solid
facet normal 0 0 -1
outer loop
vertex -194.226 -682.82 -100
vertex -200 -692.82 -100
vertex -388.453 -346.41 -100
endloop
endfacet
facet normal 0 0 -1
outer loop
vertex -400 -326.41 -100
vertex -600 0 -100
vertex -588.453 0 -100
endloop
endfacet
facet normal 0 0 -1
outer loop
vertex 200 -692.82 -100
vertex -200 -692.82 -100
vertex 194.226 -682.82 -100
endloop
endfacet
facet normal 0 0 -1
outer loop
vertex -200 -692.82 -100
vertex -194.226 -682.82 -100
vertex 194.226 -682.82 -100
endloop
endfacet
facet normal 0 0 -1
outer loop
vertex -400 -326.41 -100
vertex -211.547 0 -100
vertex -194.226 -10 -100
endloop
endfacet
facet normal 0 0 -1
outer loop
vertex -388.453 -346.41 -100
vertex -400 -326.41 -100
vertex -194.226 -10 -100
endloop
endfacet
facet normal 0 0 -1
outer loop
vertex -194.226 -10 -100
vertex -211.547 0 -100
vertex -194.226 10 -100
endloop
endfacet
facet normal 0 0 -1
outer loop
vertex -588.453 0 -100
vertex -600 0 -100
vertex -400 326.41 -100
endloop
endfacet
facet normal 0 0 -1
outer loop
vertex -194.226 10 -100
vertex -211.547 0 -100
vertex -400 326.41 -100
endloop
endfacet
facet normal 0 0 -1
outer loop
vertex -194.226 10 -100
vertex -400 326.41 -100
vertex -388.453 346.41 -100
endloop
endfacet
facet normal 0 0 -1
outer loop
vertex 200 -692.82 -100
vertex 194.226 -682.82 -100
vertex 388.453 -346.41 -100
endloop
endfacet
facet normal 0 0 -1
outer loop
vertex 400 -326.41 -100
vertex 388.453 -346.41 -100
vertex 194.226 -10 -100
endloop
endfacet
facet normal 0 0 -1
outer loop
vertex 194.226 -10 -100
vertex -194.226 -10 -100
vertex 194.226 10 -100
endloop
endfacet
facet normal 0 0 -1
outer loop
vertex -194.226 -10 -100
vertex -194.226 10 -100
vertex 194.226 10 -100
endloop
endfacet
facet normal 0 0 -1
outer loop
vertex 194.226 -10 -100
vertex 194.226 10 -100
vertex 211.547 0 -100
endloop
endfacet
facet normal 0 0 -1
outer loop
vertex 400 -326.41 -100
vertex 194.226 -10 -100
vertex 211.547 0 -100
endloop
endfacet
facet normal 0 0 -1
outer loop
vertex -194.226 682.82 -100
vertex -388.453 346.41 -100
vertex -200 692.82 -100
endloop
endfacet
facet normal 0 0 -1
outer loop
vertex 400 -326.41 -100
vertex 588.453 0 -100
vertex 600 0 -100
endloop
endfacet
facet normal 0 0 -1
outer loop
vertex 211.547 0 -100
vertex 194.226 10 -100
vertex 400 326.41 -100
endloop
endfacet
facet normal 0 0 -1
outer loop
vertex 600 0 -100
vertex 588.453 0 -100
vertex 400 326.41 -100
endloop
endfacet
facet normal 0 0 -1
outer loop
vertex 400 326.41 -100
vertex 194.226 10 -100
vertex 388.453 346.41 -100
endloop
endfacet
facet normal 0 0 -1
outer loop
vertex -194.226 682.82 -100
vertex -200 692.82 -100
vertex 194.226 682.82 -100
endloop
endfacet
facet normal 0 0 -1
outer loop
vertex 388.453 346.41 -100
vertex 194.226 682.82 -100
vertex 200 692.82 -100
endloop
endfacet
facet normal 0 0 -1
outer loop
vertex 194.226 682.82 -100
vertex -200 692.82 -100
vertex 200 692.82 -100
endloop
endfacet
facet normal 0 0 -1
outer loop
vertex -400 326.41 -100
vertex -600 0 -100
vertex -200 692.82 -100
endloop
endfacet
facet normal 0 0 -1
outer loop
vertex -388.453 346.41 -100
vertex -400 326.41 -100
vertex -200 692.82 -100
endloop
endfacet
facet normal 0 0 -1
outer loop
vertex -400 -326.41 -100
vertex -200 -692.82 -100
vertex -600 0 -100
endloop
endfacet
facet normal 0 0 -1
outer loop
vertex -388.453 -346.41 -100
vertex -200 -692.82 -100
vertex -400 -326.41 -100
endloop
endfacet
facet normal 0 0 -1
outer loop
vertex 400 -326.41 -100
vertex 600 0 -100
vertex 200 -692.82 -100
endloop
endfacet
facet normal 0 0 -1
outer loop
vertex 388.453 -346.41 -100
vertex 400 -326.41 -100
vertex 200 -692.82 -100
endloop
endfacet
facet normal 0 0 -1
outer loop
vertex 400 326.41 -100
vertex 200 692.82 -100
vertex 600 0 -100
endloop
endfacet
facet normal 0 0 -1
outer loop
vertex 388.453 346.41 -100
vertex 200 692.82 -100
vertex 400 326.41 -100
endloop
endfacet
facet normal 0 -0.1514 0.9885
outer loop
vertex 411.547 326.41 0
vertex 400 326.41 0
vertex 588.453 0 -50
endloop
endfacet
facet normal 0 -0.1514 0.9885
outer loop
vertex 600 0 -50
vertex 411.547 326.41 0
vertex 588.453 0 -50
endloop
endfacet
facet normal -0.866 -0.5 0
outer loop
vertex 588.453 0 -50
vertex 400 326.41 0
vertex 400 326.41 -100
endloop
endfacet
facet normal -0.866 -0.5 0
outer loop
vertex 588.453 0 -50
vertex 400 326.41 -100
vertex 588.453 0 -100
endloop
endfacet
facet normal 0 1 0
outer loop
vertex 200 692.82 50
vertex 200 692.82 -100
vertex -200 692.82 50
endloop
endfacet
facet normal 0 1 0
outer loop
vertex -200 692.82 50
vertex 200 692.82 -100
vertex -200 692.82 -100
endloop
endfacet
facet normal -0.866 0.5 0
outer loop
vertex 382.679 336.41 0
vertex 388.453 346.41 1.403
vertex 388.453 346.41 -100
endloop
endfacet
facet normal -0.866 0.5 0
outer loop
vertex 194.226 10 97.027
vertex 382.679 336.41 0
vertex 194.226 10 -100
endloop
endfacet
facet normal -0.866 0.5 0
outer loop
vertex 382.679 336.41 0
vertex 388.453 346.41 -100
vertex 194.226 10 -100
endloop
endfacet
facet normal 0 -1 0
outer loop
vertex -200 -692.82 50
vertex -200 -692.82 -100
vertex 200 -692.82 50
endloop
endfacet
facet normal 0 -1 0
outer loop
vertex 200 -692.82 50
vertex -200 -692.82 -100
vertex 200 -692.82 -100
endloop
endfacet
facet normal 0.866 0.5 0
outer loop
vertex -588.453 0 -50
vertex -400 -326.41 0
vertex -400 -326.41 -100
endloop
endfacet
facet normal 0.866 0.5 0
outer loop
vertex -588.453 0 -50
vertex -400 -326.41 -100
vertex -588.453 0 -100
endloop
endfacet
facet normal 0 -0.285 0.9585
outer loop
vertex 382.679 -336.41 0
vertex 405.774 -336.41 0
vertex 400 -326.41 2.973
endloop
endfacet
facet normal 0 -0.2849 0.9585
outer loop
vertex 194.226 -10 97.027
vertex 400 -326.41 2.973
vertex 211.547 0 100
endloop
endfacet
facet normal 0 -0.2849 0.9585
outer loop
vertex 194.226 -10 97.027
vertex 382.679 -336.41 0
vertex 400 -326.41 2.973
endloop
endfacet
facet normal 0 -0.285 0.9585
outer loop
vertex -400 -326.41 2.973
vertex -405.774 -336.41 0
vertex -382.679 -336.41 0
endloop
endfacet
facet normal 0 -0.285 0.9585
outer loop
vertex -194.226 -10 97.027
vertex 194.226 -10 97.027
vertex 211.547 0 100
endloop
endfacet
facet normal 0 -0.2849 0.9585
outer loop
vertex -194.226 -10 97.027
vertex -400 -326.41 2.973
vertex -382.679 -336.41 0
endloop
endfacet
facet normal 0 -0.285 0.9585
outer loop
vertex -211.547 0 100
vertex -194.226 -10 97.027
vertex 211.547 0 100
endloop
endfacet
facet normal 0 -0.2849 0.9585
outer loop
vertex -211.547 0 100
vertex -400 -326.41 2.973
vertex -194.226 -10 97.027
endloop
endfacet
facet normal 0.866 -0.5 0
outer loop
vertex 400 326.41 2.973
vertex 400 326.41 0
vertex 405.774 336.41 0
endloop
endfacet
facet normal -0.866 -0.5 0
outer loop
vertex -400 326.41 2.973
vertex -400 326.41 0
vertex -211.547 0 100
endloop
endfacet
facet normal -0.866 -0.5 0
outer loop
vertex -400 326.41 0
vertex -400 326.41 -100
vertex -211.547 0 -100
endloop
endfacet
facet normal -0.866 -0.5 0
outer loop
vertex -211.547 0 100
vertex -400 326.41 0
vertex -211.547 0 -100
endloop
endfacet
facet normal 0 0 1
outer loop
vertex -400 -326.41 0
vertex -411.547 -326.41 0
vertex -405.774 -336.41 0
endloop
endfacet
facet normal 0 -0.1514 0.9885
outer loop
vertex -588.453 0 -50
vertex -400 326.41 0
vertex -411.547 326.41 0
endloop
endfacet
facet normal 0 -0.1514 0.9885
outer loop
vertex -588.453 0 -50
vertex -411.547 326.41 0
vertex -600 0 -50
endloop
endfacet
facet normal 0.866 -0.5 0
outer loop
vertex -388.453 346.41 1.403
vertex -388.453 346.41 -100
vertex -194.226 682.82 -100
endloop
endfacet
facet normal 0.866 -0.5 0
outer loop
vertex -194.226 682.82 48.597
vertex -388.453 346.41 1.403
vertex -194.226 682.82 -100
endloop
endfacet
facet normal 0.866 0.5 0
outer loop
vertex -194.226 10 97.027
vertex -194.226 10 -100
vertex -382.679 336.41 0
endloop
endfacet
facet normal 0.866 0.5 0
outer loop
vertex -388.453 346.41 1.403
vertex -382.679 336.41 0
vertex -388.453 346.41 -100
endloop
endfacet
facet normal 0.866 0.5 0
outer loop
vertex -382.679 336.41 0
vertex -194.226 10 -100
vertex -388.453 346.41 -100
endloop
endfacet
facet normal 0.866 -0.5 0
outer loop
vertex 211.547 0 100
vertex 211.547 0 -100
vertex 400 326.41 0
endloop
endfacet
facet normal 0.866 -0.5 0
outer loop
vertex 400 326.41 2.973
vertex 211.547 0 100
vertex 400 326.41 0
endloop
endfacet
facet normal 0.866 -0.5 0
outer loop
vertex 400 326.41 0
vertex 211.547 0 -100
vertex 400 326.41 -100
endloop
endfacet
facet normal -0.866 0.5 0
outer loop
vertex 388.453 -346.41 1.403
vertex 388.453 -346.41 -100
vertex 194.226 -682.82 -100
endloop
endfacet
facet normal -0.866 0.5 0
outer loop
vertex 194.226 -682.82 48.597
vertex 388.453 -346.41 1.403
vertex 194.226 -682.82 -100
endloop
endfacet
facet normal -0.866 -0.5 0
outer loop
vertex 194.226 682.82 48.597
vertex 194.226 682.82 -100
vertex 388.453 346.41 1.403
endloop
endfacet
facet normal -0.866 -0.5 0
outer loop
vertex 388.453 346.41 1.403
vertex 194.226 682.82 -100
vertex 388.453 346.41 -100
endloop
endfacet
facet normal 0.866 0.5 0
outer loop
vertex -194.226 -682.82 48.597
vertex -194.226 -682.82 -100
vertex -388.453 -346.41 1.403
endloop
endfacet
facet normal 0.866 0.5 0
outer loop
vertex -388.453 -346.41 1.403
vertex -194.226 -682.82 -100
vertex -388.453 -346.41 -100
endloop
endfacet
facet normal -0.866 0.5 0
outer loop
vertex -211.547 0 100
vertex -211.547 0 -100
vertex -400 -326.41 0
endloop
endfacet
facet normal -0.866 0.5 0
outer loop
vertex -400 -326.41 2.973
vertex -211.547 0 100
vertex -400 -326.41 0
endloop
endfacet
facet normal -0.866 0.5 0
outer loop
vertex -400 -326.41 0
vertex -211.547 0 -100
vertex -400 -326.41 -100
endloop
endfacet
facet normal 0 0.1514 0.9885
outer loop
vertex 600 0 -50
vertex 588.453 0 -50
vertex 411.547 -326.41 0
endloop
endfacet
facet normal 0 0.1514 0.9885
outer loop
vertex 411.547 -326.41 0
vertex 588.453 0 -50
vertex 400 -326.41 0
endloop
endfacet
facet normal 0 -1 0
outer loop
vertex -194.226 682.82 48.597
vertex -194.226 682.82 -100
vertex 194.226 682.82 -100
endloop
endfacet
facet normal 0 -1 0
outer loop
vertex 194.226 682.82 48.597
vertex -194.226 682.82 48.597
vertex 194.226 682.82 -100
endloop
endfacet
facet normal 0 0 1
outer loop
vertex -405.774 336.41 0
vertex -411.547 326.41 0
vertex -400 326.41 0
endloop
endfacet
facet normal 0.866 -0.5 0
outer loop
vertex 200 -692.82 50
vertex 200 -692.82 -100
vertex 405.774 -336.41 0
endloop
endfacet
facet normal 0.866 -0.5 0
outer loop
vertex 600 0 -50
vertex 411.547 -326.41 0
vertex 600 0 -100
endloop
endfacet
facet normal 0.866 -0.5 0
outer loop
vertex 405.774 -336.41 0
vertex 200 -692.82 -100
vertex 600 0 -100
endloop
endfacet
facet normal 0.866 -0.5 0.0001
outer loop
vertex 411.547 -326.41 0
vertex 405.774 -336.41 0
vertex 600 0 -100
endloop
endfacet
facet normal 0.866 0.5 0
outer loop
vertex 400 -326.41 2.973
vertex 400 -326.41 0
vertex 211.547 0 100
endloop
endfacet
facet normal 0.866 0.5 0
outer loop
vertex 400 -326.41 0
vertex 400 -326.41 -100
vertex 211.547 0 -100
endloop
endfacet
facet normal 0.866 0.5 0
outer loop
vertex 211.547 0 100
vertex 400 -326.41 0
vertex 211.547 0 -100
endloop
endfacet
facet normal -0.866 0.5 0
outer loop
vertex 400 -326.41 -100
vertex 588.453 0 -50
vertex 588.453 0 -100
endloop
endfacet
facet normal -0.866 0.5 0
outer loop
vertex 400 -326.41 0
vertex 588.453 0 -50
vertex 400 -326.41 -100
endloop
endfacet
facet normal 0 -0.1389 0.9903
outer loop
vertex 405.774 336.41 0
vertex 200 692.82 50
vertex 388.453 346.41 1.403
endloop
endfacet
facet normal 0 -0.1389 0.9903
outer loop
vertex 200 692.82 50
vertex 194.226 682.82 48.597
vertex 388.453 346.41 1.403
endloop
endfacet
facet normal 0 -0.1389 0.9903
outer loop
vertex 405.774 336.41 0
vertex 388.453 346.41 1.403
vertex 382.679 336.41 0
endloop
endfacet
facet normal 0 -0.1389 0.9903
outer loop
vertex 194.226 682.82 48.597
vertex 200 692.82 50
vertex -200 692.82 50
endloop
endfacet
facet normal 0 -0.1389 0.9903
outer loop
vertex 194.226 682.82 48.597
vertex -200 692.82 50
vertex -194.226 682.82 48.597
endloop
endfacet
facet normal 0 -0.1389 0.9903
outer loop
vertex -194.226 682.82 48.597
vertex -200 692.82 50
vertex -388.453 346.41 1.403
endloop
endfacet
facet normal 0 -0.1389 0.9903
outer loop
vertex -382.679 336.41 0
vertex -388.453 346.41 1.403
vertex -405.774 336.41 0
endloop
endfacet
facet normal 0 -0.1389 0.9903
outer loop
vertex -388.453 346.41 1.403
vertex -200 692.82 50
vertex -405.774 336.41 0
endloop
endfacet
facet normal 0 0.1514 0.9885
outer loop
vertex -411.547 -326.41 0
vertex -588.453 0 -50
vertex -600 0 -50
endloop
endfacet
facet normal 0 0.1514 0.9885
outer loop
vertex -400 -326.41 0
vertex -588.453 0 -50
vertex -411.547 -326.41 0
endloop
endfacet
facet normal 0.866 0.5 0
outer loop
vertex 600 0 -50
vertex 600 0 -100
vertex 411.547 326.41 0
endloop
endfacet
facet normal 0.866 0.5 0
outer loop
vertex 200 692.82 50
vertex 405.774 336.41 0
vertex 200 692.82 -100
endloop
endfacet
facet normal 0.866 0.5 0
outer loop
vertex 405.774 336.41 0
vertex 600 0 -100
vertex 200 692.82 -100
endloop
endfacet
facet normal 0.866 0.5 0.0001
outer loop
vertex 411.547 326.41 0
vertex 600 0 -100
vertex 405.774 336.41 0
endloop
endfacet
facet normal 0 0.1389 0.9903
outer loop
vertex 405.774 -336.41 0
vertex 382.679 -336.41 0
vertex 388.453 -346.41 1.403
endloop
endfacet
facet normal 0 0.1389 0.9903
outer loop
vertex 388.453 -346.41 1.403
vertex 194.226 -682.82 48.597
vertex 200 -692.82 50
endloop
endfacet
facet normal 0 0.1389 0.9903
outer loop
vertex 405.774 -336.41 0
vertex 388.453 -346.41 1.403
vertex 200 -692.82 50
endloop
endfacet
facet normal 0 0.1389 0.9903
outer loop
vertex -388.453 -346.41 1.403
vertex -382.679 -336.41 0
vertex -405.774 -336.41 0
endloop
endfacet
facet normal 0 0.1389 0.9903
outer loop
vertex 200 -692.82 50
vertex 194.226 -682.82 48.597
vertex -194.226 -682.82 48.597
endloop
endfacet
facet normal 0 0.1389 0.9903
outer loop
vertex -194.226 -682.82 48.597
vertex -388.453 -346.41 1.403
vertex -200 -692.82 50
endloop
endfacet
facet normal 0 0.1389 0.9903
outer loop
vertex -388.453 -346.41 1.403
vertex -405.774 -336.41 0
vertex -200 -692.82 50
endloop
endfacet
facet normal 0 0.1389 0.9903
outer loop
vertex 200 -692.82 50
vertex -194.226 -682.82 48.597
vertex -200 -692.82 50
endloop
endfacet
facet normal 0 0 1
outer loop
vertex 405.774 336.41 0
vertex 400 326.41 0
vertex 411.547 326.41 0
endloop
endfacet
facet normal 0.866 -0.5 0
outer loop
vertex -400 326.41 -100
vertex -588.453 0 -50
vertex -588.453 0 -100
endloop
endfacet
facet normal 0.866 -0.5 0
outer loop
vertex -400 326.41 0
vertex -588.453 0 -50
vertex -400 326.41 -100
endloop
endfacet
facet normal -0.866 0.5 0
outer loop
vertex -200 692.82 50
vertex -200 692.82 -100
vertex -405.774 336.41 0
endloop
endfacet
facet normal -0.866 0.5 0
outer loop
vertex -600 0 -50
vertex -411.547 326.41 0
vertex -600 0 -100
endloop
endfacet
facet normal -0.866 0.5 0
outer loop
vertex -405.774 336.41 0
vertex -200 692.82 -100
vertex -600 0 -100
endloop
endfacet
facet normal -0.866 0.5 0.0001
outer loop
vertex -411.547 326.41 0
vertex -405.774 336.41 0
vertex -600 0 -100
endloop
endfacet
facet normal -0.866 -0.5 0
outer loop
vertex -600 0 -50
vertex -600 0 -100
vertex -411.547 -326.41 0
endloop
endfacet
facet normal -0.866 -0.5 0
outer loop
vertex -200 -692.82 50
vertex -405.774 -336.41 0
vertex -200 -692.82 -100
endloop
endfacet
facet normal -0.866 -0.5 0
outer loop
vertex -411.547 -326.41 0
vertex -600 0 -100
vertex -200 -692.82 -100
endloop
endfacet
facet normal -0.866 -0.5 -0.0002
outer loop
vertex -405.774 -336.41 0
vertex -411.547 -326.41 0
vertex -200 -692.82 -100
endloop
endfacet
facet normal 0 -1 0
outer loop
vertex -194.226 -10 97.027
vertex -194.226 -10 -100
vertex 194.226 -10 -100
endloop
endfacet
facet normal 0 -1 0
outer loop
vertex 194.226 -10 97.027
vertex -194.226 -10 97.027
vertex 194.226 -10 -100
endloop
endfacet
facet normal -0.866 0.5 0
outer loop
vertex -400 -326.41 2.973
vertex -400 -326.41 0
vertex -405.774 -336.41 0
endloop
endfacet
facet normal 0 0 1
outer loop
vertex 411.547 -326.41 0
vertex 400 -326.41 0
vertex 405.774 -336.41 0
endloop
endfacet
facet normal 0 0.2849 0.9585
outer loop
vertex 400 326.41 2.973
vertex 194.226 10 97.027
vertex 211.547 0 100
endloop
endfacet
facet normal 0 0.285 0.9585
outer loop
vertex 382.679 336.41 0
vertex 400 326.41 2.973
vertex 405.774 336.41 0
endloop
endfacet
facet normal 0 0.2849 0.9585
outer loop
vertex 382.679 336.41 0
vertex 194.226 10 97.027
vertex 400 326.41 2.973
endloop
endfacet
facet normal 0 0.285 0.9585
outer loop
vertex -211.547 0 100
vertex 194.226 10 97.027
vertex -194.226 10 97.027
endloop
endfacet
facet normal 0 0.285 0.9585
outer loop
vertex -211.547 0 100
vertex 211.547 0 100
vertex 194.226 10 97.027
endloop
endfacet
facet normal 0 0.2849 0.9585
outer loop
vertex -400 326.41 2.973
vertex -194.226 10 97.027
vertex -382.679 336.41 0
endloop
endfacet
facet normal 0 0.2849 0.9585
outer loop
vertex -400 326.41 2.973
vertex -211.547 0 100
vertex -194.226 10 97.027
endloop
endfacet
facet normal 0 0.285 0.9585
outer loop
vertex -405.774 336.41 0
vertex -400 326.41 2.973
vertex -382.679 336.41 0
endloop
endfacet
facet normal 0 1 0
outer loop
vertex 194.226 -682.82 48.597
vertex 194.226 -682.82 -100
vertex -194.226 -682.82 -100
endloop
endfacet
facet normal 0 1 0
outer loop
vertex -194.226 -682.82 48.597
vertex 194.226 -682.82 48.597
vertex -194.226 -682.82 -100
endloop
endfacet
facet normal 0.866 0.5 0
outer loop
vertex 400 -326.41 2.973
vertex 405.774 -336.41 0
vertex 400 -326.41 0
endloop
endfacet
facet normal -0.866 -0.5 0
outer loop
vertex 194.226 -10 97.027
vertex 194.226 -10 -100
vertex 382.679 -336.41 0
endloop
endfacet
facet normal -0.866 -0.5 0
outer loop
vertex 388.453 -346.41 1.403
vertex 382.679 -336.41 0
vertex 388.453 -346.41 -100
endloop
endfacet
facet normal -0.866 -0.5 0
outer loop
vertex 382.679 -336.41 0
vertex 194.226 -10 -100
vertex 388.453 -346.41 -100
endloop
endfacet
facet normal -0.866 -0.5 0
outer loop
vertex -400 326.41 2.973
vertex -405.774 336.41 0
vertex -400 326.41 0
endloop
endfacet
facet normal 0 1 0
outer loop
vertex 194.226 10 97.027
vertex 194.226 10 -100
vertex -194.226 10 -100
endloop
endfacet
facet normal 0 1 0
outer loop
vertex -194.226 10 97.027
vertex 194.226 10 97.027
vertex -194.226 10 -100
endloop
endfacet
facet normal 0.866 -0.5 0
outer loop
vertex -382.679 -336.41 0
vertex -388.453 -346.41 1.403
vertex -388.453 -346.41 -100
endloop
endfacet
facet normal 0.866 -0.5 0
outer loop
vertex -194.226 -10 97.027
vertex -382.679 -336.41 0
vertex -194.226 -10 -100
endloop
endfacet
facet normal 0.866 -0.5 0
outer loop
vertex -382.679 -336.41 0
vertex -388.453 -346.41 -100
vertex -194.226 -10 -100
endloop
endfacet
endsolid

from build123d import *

# Parameters (mm, degrees)
EXTRUDE_1_DEPTH     = 100
EXTRUDE_2_DEPTH     = 100
EXTRUDE_3_DEPTH     = 100
EXTRUDE_START       = -100
EXTRUDE_4_DEPTH     = 100
CUT_EXTRUDE_1_DEPTH = 1221.655561574
EXTRUDE_1_2_DEPTH   = 100
CUT_EXTRUDE_2_DEPTH = 1226.38987213


# Read off the part's stored shape, not the designer's step: 拉伸-薄壁4
with BuildPart() as part:
    # 草图1 → Extrude 1 (new body)
    with BuildSketch(Plane.XY):
        Polygon((-600, 0), (-400, 346.410161514), (-200, 0), (-400, -346.410161514), align=None)
        Polygon((-588.452994616, 0), (-400, 326.410161514), (-211.547005384, 0), (-400, -326.410161514), align=None, mode=Mode.SUBTRACT)
    extrude(amount=-EXTRUDE_1_DEPTH)

    # 草图1<4> → 拉伸-薄壁2 (add)
    with BuildSketch(Plane.XY):
        Polygon((400, -346.410161514), (200, -692.820323028), (-200, -692.820323028), (-400, -346.410161514), (-200, 0), (0, 0), (200, 0), align=None)
        Polygon((388.452994616, -346.410161514), (194.226497308, -682.820323028), (-194.226497308, -682.820323028), (-388.452994616, -346.410161514), (-194.226497308, -10), (0, -10), (194.226497308, -10), align=None, mode=Mode.SUBTRACT)
    extrude(amount=-EXTRUDE_2_DEPTH)

    # 草图1<5> → 拉伸-薄壁3 (add)
    with BuildSketch(Plane.XY):
        Polygon((400, -346.410161514), (200, 0), (400, 346.410161514), (600, 0), align=None)
        Polygon((400, -326.410161514), (211.547005384, 0), (400, 326.410161514), (588.452994616, 0), align=None, mode=Mode.SUBTRACT)
    extrude(amount=-EXTRUDE_3_DEPTH)

    # 拉伸-薄壁4 outline → 拉伸-薄壁4 (add)
    with BuildSketch(Plane.XY.offset(EXTRUDE_START)):
        Polygon((200, 692.820323028), (-200, 692.820323028), (-400, 346.410161514), (-200, 0), (200, 0), (400, 346.410161514), align=None)
        Polygon((-194.226497308, 10), (-388.452994616, 346.410161514), (-194.226497308, 682.820323028), (194.226497308, 682.820323028), (388.452994616, 346.410161514), (194.226497308, 10), align=None, mode=Mode.SUBTRACT)
    extrude(amount=EXTRUDE_4_DEPTH)

    # 草图4 → 切除-拉伸1 (cut, through all)
    with BuildSketch(Plane(origin=(-400, 0, 0), x_dir=(0, 0, -1), z_dir=(1, 0, 0))):
        Polygon((50, 0), (0, -326.410161514), (0, 0), (0, 326.410161514), align=None)
    cut_extrude_1 = extrude(amount=-CUT_EXTRUDE_1_DEPTH, mode=Mode.SUBTRACT)

    # 镜向1: 切除-拉伸1 across plane
    add(cut_extrude_1.mirror(Plane(origin=(0, 0, 0), x_dir=(0, 0, 1), z_dir=(1, 0, 0))), mode=Mode.SUBTRACT)

    # 草图2 → Extrude 1 2 (add)
    with BuildSketch(Plane.XY):
        Polygon((388.452994616, 346.410161514), (400, 326.410161514), (405.773502692, 336.410161514), (200, 692.820323028), (-200, 692.820323028), (-405.773502692, 336.410161514), (-400, 326.410161514), (-388.452994616, 346.410161514), (-194.226497308, 682.820323028), (194.226497308, 682.820323028), align=None)
        Polygon((-400, -326.410161514), (-388.452994616, -346.410161514), (-194.226497308, -10), (194.226497308, -10), (388.452994616, -346.410161514), (400, -326.410161514), (211.547005384, 0), (400, 326.410161514), (388.452994616, 346.410161514), (194.226497308, 10), (-194.226497308, 10), (-388.452994616, 346.410161514), (-400, 326.410161514), (-211.547005384, 0), align=None)
        Polygon((405.773502692, -336.410161514), (400, -326.410161514), (388.452994616, -346.410161514), (194.226497308, -682.820323028), (-194.226497308, -682.820323028), (-388.452994616, -346.410161514), (-400, -326.410161514), (-405.773502692, -336.410161514), (-200, -692.820323028), (200, -692.820323028), align=None)
    extrude(amount=EXTRUDE_1_2_DEPTH)

    # 草图6 → 切除-拉伸2 (cut, through all)
    with BuildSketch(Plane.ZY.offset(405.773502692)):
        Polygon((100, 692.820323028), (100, 336.410161514), (0, 336.410161514), align=None)
        Polygon((100, 0), (0, 336.410161514), (100, 336.410161514), align=None)
        Polygon((100, 0), (100, -336.410161514), (0, -336.410161514), align=None)
        Polygon((100, -692.820323028), (0, -336.410161514), (100, -336.410161514), align=None)
        Polygon((50, -692.820323028), (100, -692.820323028), (50, -514.615242271), align=None)
        Polygon((50, -514.615242271), (0, -336.410161514), (50, -692.820323028), align=None)
        Polygon((50, -514.615242271), (50, -336.410161514), (0, -336.410161514), align=None)
        Polygon((50, 514.615242271), (0, 336.410161514), (50, 336.410161514), align=None)
        Polygon((50, 692.820323028), (0, 336.410161514), (50, 514.615242271), align=None)
        Polygon((50, 514.615242271), (100, 692.820323028), (50, 692.820323028), align=None)
    extrude(amount=-CUT_EXTRUDE_2_DEPTH, mode=Mode.SUBTRACT)


solid = part.part
